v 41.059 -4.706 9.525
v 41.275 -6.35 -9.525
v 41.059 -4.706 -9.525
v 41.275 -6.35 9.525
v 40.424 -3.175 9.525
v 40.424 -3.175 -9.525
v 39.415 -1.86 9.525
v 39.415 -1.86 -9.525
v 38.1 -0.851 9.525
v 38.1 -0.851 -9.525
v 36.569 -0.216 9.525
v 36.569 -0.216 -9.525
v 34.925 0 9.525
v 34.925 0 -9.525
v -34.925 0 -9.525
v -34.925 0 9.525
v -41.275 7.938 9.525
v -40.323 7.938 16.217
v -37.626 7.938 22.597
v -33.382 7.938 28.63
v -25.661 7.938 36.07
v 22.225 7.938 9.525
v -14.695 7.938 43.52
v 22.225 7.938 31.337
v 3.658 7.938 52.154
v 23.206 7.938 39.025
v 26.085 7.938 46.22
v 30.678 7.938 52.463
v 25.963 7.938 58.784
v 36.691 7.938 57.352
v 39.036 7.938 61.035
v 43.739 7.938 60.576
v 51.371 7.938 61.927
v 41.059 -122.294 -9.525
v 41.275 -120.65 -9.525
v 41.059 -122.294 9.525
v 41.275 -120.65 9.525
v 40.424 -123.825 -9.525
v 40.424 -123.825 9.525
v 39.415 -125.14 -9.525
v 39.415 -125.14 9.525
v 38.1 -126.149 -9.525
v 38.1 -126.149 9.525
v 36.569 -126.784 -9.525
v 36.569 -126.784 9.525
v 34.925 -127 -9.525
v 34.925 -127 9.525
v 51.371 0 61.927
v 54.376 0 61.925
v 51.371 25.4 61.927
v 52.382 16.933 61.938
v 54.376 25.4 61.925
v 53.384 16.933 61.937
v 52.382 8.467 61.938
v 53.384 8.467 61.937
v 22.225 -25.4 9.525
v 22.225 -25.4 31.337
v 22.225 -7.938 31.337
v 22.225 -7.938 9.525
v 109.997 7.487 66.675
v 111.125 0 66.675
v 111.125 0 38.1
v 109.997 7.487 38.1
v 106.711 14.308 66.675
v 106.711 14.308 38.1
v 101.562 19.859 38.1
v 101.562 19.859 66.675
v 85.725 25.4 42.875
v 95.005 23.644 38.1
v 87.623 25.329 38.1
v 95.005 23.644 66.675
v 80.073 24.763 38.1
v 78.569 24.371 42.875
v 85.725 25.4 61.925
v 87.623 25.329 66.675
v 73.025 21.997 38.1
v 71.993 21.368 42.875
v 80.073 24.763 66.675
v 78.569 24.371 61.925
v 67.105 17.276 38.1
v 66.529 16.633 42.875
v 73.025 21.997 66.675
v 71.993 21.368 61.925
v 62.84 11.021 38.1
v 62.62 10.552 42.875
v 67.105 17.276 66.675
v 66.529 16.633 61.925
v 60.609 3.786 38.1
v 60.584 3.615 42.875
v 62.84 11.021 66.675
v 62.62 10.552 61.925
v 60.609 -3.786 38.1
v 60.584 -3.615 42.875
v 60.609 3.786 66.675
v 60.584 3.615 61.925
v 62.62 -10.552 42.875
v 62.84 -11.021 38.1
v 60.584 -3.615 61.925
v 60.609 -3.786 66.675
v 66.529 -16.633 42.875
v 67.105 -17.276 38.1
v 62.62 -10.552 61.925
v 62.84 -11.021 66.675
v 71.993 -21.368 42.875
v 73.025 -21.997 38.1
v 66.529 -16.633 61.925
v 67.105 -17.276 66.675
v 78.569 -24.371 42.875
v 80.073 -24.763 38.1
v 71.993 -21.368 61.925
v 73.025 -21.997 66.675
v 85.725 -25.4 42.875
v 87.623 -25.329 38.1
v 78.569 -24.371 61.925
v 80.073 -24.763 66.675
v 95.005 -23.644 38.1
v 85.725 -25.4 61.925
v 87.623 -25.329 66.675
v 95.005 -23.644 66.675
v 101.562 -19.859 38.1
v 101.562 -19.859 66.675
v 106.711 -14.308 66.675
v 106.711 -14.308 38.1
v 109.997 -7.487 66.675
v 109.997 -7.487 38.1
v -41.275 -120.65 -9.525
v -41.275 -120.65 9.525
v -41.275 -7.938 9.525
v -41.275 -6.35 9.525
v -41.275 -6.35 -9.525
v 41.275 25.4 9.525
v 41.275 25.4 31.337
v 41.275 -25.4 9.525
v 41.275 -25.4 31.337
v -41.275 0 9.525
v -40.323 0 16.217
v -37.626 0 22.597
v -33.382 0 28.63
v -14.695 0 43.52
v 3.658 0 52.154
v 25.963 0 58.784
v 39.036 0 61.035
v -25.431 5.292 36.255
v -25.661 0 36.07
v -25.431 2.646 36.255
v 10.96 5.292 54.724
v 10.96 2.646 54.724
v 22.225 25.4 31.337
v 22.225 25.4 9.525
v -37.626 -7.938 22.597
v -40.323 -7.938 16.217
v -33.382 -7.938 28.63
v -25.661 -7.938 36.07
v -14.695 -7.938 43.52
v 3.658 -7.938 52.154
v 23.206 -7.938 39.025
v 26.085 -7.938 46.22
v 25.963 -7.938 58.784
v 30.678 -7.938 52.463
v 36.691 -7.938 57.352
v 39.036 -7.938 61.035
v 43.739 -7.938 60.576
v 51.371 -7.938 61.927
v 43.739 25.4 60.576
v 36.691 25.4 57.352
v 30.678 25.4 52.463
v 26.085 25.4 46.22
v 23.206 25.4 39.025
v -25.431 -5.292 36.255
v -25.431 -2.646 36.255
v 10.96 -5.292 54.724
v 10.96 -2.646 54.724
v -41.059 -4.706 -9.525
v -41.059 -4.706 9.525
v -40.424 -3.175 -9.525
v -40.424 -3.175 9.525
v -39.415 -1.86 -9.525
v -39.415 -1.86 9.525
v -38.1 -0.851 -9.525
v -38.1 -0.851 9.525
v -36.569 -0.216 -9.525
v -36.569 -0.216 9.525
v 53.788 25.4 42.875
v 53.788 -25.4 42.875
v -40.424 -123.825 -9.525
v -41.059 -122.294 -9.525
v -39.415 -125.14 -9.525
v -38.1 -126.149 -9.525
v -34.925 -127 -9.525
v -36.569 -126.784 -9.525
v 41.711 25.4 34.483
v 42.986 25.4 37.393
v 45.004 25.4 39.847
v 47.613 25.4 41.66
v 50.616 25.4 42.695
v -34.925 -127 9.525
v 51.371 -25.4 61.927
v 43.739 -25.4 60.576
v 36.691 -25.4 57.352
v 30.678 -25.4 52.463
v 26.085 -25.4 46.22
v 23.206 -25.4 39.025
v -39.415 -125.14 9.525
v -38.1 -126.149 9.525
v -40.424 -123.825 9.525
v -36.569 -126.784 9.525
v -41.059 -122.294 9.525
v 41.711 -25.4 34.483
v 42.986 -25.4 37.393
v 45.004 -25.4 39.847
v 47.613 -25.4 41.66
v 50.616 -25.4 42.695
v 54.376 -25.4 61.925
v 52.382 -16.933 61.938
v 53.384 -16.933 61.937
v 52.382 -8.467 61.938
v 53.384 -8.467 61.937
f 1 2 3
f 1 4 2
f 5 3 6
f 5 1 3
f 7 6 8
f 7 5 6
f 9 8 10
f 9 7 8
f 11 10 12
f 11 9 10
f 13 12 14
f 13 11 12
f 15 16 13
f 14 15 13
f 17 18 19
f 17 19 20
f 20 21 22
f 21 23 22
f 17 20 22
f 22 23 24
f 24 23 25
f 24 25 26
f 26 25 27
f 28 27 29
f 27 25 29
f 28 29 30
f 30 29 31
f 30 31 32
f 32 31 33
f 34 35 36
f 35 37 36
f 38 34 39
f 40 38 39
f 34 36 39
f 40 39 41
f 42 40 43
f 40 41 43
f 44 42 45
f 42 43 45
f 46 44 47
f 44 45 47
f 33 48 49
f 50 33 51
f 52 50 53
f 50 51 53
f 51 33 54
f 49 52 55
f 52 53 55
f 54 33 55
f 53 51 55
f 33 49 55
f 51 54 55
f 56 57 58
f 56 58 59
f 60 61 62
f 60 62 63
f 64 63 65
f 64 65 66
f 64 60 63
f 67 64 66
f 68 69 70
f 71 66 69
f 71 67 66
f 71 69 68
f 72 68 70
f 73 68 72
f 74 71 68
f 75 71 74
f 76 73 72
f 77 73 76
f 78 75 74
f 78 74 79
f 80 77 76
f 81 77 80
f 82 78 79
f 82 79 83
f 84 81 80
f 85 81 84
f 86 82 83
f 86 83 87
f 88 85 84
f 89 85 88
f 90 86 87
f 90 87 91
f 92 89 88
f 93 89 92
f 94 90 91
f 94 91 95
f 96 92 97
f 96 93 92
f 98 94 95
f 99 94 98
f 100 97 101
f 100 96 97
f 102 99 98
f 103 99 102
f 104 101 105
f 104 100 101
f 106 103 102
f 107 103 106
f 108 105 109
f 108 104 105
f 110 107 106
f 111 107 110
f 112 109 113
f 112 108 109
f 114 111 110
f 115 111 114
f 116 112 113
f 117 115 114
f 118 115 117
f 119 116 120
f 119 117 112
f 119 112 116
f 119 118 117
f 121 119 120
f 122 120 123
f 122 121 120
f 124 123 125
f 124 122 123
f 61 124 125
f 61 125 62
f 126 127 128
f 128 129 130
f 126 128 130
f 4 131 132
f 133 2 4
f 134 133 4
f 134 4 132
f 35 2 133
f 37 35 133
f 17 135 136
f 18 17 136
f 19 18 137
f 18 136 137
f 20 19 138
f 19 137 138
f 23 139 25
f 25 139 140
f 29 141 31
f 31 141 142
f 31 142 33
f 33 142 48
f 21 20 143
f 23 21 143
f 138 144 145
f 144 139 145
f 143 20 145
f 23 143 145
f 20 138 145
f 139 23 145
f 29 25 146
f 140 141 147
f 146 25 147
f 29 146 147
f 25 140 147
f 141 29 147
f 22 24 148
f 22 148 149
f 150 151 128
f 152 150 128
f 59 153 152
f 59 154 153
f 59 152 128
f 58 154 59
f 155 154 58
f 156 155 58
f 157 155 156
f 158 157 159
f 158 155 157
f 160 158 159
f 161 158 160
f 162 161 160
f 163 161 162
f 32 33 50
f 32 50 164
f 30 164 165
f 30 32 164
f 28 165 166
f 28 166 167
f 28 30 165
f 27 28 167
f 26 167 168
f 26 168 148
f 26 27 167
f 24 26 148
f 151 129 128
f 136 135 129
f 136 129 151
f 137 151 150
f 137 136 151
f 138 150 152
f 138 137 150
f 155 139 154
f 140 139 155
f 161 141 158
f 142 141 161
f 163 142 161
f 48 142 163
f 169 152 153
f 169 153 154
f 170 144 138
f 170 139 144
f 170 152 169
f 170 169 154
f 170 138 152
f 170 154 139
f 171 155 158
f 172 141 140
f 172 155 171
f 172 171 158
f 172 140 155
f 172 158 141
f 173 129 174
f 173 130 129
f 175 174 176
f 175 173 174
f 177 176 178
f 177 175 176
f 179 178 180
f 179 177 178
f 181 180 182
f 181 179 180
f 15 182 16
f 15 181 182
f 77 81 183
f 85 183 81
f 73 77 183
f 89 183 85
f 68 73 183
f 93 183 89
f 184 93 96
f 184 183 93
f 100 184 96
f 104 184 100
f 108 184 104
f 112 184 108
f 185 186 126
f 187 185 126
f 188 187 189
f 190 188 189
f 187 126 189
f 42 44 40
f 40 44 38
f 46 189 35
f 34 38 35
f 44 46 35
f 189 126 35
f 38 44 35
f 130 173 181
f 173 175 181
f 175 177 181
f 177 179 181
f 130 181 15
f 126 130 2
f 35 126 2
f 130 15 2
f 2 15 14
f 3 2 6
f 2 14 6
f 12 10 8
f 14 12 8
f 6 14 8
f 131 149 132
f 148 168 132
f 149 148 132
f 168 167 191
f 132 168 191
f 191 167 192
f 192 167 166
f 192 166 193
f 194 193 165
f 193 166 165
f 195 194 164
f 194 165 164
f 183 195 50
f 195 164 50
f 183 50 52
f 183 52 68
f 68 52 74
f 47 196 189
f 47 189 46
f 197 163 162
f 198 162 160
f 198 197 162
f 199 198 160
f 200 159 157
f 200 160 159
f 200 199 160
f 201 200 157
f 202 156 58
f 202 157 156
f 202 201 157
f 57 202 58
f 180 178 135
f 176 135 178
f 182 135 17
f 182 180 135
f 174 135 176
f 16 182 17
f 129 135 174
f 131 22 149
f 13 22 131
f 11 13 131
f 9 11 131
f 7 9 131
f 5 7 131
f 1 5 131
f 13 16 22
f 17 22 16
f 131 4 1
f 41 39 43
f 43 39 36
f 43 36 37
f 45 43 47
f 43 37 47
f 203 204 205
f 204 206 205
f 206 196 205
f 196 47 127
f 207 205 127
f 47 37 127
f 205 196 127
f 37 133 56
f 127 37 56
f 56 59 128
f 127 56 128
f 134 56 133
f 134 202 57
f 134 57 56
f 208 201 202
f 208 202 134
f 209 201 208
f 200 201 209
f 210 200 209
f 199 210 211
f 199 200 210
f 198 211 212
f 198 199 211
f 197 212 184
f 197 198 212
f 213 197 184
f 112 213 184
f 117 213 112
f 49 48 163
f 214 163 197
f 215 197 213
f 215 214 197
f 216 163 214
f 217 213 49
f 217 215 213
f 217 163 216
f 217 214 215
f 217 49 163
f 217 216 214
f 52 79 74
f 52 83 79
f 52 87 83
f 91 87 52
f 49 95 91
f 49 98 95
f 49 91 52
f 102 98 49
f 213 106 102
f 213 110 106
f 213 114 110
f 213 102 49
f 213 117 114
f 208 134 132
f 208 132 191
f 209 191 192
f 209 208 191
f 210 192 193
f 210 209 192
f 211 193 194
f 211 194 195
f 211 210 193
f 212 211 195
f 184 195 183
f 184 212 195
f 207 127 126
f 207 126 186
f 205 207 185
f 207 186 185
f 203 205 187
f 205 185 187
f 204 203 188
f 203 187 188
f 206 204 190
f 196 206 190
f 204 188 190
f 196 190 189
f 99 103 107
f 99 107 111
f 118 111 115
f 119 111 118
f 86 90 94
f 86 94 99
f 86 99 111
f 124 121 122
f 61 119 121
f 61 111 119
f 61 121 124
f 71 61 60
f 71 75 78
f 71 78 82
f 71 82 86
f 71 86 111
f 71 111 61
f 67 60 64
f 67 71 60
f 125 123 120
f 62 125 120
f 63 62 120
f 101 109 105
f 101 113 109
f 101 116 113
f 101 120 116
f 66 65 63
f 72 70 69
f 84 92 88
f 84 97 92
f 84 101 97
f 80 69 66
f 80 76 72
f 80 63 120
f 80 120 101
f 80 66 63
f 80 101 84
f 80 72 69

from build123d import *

# Parameters (mm, degrees)
F1_DEPTH = 127
F0_W     = 25.4
F0_H     = 19.05
F2_DEPTH = 25.4
F3_DEPTH = 7.9375
F5_R     = 6.35


with BuildPart() as f1:
    # F0 (on Front) → F1 (new body)
    with BuildSketch(Plane.XZ):
        Polygon((41.275, -9.525), (41.275, 9.525), (22.225, 9.525), (-41.275, 9.525), (-41.275, -9.525), align=None)
    extrude(amount=F1_DEPTH)

    # F0 (on Front) → F2 (join, symmetric)
    with BuildSketch(Plane.XZ):
        with BuildLine():
            Line((22.225, 9.525), (41.275, 9.525))
            Line((41.275, 9.525), (41.275, 31.3365191218))
            ThreePointArc((41.275, 31.3365191218), (45.0038822026, 39.8471765228), (53.788352915, 42.8752))
            Line((53.788352915, 42.8752), (60.325, 42.8752))
            Line((60.325, 42.8752), (60.325, 61.9252))
            Line((60.325, 61.9252), (54.3759968817, 61.9252))
            add(Edge.make_bspline(
                [(51.370796581, 61.9273374506), (52.3872818236, 61.9429580973), (53.3895331595, 61.9423398279), (54.3759968817, 61.9252)],
                knots=[106.1406160735, 106.1406160735, 106.1406160735, 106.1406160735, 109.0637160769, 109.0637160769, 109.0637160769, 109.0637160769], degree=3))
            ThreePointArc((51.370796581, 61.9273374506), (30.6779581359, 52.4627801751), (22.225, 31.3365191218))
            Line((22.225, 31.3365191218), (22.225, 9.525))
        make_face()
        with Locations((73.025, 52.4002)):
            Rectangle(F0_W, F0_H)
    extrude(amount=F2_DEPTH, both=True)

    # F0 (on Front) → F3 (join, symmetric)
    with BuildSketch(Plane.XZ):
        with BuildLine():
            Line((-41.275, 9.525), (22.225, 9.525))
            Line((22.225, 9.525), (22.225, 31.3365191218))
            ThreePointArc((22.225, 31.3365191218), (30.6779581359, 52.4627801751), (51.370796581, 61.9273374506))
            add(Edge.make_bspline(
                [(-41.275, 9.525), (-41.2155685722, 39.382135411), (14.4612246374, 61.3601365133), (51.370796581, 61.9273374506)],
                knots=[0, 0, 0, 0, 106.1406160735, 106.1406160735, 106.1406160735, 106.1406160735], degree=3))
        make_face()
    extrude(amount=F3_DEPTH, both=True)

    # F0 (on Front) → F4 (revolve)
    with BuildSketch(Plane.XZ):
        Polygon((85.725, 61.9252), (85.725, 42.8752), (85.725, 38.1), (111.125, 38.1), (111.125, 66.675), (85.725, 66.675), align=None)
    revolve(axis=Axis((85.725, 0, 52.3875), (0, 0, 1)))

    # F5
    f5_edges = [f1.edges().sort_by_distance(p)[0] for p in [
        (41.275, -127, 0),
        (-41.275, -127, 0),
        (41.275, 0, 0),
        (-41.275, 0, 0),
    ]]
    fillet(f5_edges, radius=F5_R)


solid = f1.part
